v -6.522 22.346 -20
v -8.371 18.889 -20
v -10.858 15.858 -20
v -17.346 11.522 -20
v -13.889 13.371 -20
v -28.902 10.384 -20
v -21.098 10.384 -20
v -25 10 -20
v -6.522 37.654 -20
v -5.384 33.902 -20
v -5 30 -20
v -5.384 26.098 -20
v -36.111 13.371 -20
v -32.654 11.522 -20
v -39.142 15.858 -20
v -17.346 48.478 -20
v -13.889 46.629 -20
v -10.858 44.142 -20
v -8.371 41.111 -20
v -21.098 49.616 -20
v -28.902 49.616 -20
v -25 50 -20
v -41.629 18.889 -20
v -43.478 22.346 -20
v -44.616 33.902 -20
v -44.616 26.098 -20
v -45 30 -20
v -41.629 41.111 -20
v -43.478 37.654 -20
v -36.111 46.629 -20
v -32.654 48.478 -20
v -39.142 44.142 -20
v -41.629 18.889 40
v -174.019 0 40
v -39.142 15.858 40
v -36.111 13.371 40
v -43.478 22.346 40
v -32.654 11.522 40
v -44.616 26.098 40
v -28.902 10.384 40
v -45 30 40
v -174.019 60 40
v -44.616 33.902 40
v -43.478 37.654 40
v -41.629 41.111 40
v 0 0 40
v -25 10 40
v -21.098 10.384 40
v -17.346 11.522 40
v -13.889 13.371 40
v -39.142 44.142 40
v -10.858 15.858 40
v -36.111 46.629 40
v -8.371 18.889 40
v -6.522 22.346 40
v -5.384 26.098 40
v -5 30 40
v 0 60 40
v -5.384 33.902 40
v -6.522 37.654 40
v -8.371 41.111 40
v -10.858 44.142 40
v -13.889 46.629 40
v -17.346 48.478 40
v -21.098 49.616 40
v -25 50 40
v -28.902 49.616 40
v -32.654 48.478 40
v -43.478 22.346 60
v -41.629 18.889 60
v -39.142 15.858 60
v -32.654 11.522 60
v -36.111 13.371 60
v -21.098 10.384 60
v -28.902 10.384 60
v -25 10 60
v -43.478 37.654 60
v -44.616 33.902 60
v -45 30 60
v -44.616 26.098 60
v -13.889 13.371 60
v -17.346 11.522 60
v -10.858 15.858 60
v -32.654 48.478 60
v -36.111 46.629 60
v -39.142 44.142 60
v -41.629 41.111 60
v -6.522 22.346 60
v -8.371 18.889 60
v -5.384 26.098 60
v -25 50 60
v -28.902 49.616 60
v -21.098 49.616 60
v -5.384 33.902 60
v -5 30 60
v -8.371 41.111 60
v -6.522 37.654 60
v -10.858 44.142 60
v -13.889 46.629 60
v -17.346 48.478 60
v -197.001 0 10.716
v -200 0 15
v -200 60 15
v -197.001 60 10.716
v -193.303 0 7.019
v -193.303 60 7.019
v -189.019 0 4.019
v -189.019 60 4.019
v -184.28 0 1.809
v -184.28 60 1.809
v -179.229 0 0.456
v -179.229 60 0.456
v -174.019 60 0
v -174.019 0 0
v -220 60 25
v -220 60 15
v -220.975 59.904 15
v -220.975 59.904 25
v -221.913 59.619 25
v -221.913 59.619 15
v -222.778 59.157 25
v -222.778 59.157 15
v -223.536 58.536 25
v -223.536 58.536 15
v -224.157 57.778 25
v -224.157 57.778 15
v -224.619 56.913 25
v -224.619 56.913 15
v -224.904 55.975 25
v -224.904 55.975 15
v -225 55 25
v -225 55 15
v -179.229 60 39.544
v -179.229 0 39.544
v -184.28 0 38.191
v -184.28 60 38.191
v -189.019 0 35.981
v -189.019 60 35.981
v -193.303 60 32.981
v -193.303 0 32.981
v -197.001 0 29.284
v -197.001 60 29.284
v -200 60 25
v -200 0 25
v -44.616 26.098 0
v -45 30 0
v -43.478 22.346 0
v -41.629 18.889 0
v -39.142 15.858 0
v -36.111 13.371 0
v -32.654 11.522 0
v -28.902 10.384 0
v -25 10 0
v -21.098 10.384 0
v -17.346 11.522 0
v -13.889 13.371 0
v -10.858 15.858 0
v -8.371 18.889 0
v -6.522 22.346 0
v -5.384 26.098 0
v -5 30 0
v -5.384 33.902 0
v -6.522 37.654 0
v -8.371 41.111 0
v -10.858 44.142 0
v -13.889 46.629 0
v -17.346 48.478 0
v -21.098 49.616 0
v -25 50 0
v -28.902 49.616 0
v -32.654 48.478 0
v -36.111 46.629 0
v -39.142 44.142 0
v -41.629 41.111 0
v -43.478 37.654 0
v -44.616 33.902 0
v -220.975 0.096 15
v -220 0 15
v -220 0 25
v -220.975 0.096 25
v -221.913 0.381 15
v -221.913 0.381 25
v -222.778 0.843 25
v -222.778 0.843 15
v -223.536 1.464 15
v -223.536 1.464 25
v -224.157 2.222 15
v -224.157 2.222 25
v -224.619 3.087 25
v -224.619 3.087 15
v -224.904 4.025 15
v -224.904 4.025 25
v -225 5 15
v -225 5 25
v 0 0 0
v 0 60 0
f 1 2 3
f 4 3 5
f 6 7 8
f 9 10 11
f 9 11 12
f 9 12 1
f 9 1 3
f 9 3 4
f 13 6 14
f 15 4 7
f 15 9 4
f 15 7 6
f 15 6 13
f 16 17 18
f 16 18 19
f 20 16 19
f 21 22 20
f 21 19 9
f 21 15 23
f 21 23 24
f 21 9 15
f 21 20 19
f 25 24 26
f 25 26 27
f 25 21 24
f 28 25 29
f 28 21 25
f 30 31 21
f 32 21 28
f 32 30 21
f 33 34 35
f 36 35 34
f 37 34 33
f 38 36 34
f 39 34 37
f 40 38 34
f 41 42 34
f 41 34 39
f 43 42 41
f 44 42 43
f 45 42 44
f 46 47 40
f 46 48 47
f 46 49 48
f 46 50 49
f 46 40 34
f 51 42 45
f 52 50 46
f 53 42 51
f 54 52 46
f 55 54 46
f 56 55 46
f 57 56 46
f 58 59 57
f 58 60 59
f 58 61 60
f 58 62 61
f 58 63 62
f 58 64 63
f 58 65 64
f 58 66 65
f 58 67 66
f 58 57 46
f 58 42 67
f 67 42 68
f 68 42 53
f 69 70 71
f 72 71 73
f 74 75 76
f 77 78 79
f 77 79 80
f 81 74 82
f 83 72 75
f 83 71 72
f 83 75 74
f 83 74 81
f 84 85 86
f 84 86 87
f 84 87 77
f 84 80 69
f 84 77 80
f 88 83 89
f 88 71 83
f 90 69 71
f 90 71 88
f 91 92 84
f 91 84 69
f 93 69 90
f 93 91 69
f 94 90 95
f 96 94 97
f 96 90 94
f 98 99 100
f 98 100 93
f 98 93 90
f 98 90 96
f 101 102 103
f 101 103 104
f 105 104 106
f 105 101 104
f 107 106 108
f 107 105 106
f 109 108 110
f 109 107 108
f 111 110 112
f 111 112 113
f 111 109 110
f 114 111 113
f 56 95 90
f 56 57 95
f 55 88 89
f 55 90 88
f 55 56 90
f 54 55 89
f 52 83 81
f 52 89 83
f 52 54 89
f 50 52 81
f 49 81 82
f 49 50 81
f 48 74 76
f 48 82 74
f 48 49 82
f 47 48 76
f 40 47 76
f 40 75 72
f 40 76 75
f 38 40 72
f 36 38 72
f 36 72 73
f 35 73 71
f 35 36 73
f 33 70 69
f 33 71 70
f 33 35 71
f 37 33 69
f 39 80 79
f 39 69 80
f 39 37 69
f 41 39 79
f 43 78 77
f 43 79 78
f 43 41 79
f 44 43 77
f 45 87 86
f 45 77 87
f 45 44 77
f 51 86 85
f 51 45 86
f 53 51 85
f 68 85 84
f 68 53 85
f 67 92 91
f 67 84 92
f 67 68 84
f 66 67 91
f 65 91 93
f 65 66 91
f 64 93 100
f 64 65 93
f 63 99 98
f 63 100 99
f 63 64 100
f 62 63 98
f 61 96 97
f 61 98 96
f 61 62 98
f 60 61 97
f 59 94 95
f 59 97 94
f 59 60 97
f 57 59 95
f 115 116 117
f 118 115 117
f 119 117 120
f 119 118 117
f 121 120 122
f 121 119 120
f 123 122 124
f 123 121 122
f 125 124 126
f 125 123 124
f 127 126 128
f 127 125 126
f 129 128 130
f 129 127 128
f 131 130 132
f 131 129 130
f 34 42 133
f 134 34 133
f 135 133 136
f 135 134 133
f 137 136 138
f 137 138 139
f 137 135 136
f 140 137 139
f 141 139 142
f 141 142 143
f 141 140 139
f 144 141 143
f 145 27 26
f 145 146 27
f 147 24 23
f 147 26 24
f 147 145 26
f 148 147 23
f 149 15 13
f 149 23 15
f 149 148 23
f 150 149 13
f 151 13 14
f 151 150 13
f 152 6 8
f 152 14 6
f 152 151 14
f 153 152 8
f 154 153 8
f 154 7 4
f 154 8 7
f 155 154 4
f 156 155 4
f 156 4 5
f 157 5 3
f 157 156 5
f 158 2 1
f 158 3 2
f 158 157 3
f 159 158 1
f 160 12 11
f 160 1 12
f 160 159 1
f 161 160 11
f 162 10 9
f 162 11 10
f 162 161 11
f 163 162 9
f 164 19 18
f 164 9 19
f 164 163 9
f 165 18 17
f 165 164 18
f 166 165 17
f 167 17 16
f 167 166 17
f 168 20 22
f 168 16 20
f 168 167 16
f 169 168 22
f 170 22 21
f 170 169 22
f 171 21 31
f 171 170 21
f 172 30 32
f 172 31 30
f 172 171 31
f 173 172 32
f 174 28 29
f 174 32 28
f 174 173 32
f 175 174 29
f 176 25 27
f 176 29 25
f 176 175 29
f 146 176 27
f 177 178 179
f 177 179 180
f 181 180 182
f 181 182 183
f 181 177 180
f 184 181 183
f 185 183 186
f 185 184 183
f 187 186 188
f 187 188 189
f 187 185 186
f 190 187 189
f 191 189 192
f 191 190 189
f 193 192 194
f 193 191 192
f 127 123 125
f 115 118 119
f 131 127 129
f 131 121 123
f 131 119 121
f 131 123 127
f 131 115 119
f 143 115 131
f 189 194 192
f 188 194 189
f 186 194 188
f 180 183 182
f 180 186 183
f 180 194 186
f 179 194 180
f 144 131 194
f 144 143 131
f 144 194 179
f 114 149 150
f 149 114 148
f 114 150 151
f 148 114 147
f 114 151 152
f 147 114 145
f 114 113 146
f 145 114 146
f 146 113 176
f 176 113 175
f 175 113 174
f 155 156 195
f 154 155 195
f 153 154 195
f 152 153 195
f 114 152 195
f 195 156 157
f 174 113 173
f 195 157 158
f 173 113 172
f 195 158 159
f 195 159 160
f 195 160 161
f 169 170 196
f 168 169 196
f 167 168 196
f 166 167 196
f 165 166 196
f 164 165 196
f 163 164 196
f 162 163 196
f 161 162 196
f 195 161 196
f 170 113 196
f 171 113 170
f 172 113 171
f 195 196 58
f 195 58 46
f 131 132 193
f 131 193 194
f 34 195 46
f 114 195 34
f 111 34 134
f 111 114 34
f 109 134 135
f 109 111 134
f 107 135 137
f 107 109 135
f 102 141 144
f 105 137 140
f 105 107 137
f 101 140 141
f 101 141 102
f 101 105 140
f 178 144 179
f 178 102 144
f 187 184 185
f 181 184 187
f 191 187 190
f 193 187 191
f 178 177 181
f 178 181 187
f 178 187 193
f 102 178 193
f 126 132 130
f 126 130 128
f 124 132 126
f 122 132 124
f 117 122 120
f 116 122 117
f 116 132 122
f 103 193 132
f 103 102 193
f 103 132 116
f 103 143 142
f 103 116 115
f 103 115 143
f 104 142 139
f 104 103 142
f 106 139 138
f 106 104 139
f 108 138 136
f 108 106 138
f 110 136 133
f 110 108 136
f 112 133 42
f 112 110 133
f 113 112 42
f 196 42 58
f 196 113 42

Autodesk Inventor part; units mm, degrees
ref_plane "YZ Plane" through (0, 0, 0) normal (1, 0, 0) x (0, 1, 0)
ref_plane "XZ Plane" through (0, 0, 0) normal (0, 1, 0) x (-1, 0, 0)
ref_plane "XY Plane" through (0, 0, 0) normal (0, 0, 1) x (1, 0, 0)
sketch "Sketch1" plane through (0, 0, 0) normal (0, 0, 1) x (1, 0, 0)
  line L0 (0, 0) -> (-200, 0)
  line L1 (-200, 0) -> (-200, 60)
  line L2 (-200, 60) -> (0, 60)
  line L3 (0, 60) -> (0, 0)
  dimension "d0" = 200
  dimension "d1" = 60
extrude "Extrusion1" add sketch "Sketch1" along normal blind 40
sketch "Sketch2" plane through (0, 0, 40) normal (0, 0, 1) x (1, 0, 0)
  circle A0 centre (-25, 30) radius 20
  line L0 (0, 60) -> (-200, 60) projected
  line L1 (0, 0) -> (0, 60) projected
  dimension "d4" = 40
  dimension "d5" = 30
  dimension "d6" = 25
extrude "Extrusion2" add sketch "Sketch2" along normal mid plane 40
sketch "Sketch3" plane through (0, 0, 0) normal (0, 0, -1) x (-1, 0, 0)
  circle A0 centre (25, 30) radius 20 projected
  circle A1 centre (25, 30) radius 20
  point P0 (0, 0)
extrude "Extrusion3" add sketch "Sketch3" along normal mid plane 40
sketch "Sketch4" plane through (-200, 0, 0) normal (-1, 0, 0) x (0, 0, 1)
  line L0 (0, 60) -> (40, 60) projected
  line L1 (25, 0) -> (15, 0)
  line L2 (15, 0) -> (15, 60)
  line L3 (15, 60) -> (25, 60)
  line L4 (25, 60) -> (25, 0)
  line L5 (0, 60) -> (0, 0) projected
  line L6 (40, 60) -> (40, 0) projected
  dimension "d11" = 10
  dimension "d12" = 60
  dimension "d13" = 15
  dimension "d14" = 15
  dimension "d15" = 60
extrude "Extrusion4" add sketch "Sketch4" along normal mid plane 50
fillet "Fillet1" radius 30 2 edges at (-200, 30, 0) (-200, 30, 40)
fillet "Fillet2" radius 5 2 edges at (-225, 60, 20) (-225, 0, 20)
properties part number "Part4final"
